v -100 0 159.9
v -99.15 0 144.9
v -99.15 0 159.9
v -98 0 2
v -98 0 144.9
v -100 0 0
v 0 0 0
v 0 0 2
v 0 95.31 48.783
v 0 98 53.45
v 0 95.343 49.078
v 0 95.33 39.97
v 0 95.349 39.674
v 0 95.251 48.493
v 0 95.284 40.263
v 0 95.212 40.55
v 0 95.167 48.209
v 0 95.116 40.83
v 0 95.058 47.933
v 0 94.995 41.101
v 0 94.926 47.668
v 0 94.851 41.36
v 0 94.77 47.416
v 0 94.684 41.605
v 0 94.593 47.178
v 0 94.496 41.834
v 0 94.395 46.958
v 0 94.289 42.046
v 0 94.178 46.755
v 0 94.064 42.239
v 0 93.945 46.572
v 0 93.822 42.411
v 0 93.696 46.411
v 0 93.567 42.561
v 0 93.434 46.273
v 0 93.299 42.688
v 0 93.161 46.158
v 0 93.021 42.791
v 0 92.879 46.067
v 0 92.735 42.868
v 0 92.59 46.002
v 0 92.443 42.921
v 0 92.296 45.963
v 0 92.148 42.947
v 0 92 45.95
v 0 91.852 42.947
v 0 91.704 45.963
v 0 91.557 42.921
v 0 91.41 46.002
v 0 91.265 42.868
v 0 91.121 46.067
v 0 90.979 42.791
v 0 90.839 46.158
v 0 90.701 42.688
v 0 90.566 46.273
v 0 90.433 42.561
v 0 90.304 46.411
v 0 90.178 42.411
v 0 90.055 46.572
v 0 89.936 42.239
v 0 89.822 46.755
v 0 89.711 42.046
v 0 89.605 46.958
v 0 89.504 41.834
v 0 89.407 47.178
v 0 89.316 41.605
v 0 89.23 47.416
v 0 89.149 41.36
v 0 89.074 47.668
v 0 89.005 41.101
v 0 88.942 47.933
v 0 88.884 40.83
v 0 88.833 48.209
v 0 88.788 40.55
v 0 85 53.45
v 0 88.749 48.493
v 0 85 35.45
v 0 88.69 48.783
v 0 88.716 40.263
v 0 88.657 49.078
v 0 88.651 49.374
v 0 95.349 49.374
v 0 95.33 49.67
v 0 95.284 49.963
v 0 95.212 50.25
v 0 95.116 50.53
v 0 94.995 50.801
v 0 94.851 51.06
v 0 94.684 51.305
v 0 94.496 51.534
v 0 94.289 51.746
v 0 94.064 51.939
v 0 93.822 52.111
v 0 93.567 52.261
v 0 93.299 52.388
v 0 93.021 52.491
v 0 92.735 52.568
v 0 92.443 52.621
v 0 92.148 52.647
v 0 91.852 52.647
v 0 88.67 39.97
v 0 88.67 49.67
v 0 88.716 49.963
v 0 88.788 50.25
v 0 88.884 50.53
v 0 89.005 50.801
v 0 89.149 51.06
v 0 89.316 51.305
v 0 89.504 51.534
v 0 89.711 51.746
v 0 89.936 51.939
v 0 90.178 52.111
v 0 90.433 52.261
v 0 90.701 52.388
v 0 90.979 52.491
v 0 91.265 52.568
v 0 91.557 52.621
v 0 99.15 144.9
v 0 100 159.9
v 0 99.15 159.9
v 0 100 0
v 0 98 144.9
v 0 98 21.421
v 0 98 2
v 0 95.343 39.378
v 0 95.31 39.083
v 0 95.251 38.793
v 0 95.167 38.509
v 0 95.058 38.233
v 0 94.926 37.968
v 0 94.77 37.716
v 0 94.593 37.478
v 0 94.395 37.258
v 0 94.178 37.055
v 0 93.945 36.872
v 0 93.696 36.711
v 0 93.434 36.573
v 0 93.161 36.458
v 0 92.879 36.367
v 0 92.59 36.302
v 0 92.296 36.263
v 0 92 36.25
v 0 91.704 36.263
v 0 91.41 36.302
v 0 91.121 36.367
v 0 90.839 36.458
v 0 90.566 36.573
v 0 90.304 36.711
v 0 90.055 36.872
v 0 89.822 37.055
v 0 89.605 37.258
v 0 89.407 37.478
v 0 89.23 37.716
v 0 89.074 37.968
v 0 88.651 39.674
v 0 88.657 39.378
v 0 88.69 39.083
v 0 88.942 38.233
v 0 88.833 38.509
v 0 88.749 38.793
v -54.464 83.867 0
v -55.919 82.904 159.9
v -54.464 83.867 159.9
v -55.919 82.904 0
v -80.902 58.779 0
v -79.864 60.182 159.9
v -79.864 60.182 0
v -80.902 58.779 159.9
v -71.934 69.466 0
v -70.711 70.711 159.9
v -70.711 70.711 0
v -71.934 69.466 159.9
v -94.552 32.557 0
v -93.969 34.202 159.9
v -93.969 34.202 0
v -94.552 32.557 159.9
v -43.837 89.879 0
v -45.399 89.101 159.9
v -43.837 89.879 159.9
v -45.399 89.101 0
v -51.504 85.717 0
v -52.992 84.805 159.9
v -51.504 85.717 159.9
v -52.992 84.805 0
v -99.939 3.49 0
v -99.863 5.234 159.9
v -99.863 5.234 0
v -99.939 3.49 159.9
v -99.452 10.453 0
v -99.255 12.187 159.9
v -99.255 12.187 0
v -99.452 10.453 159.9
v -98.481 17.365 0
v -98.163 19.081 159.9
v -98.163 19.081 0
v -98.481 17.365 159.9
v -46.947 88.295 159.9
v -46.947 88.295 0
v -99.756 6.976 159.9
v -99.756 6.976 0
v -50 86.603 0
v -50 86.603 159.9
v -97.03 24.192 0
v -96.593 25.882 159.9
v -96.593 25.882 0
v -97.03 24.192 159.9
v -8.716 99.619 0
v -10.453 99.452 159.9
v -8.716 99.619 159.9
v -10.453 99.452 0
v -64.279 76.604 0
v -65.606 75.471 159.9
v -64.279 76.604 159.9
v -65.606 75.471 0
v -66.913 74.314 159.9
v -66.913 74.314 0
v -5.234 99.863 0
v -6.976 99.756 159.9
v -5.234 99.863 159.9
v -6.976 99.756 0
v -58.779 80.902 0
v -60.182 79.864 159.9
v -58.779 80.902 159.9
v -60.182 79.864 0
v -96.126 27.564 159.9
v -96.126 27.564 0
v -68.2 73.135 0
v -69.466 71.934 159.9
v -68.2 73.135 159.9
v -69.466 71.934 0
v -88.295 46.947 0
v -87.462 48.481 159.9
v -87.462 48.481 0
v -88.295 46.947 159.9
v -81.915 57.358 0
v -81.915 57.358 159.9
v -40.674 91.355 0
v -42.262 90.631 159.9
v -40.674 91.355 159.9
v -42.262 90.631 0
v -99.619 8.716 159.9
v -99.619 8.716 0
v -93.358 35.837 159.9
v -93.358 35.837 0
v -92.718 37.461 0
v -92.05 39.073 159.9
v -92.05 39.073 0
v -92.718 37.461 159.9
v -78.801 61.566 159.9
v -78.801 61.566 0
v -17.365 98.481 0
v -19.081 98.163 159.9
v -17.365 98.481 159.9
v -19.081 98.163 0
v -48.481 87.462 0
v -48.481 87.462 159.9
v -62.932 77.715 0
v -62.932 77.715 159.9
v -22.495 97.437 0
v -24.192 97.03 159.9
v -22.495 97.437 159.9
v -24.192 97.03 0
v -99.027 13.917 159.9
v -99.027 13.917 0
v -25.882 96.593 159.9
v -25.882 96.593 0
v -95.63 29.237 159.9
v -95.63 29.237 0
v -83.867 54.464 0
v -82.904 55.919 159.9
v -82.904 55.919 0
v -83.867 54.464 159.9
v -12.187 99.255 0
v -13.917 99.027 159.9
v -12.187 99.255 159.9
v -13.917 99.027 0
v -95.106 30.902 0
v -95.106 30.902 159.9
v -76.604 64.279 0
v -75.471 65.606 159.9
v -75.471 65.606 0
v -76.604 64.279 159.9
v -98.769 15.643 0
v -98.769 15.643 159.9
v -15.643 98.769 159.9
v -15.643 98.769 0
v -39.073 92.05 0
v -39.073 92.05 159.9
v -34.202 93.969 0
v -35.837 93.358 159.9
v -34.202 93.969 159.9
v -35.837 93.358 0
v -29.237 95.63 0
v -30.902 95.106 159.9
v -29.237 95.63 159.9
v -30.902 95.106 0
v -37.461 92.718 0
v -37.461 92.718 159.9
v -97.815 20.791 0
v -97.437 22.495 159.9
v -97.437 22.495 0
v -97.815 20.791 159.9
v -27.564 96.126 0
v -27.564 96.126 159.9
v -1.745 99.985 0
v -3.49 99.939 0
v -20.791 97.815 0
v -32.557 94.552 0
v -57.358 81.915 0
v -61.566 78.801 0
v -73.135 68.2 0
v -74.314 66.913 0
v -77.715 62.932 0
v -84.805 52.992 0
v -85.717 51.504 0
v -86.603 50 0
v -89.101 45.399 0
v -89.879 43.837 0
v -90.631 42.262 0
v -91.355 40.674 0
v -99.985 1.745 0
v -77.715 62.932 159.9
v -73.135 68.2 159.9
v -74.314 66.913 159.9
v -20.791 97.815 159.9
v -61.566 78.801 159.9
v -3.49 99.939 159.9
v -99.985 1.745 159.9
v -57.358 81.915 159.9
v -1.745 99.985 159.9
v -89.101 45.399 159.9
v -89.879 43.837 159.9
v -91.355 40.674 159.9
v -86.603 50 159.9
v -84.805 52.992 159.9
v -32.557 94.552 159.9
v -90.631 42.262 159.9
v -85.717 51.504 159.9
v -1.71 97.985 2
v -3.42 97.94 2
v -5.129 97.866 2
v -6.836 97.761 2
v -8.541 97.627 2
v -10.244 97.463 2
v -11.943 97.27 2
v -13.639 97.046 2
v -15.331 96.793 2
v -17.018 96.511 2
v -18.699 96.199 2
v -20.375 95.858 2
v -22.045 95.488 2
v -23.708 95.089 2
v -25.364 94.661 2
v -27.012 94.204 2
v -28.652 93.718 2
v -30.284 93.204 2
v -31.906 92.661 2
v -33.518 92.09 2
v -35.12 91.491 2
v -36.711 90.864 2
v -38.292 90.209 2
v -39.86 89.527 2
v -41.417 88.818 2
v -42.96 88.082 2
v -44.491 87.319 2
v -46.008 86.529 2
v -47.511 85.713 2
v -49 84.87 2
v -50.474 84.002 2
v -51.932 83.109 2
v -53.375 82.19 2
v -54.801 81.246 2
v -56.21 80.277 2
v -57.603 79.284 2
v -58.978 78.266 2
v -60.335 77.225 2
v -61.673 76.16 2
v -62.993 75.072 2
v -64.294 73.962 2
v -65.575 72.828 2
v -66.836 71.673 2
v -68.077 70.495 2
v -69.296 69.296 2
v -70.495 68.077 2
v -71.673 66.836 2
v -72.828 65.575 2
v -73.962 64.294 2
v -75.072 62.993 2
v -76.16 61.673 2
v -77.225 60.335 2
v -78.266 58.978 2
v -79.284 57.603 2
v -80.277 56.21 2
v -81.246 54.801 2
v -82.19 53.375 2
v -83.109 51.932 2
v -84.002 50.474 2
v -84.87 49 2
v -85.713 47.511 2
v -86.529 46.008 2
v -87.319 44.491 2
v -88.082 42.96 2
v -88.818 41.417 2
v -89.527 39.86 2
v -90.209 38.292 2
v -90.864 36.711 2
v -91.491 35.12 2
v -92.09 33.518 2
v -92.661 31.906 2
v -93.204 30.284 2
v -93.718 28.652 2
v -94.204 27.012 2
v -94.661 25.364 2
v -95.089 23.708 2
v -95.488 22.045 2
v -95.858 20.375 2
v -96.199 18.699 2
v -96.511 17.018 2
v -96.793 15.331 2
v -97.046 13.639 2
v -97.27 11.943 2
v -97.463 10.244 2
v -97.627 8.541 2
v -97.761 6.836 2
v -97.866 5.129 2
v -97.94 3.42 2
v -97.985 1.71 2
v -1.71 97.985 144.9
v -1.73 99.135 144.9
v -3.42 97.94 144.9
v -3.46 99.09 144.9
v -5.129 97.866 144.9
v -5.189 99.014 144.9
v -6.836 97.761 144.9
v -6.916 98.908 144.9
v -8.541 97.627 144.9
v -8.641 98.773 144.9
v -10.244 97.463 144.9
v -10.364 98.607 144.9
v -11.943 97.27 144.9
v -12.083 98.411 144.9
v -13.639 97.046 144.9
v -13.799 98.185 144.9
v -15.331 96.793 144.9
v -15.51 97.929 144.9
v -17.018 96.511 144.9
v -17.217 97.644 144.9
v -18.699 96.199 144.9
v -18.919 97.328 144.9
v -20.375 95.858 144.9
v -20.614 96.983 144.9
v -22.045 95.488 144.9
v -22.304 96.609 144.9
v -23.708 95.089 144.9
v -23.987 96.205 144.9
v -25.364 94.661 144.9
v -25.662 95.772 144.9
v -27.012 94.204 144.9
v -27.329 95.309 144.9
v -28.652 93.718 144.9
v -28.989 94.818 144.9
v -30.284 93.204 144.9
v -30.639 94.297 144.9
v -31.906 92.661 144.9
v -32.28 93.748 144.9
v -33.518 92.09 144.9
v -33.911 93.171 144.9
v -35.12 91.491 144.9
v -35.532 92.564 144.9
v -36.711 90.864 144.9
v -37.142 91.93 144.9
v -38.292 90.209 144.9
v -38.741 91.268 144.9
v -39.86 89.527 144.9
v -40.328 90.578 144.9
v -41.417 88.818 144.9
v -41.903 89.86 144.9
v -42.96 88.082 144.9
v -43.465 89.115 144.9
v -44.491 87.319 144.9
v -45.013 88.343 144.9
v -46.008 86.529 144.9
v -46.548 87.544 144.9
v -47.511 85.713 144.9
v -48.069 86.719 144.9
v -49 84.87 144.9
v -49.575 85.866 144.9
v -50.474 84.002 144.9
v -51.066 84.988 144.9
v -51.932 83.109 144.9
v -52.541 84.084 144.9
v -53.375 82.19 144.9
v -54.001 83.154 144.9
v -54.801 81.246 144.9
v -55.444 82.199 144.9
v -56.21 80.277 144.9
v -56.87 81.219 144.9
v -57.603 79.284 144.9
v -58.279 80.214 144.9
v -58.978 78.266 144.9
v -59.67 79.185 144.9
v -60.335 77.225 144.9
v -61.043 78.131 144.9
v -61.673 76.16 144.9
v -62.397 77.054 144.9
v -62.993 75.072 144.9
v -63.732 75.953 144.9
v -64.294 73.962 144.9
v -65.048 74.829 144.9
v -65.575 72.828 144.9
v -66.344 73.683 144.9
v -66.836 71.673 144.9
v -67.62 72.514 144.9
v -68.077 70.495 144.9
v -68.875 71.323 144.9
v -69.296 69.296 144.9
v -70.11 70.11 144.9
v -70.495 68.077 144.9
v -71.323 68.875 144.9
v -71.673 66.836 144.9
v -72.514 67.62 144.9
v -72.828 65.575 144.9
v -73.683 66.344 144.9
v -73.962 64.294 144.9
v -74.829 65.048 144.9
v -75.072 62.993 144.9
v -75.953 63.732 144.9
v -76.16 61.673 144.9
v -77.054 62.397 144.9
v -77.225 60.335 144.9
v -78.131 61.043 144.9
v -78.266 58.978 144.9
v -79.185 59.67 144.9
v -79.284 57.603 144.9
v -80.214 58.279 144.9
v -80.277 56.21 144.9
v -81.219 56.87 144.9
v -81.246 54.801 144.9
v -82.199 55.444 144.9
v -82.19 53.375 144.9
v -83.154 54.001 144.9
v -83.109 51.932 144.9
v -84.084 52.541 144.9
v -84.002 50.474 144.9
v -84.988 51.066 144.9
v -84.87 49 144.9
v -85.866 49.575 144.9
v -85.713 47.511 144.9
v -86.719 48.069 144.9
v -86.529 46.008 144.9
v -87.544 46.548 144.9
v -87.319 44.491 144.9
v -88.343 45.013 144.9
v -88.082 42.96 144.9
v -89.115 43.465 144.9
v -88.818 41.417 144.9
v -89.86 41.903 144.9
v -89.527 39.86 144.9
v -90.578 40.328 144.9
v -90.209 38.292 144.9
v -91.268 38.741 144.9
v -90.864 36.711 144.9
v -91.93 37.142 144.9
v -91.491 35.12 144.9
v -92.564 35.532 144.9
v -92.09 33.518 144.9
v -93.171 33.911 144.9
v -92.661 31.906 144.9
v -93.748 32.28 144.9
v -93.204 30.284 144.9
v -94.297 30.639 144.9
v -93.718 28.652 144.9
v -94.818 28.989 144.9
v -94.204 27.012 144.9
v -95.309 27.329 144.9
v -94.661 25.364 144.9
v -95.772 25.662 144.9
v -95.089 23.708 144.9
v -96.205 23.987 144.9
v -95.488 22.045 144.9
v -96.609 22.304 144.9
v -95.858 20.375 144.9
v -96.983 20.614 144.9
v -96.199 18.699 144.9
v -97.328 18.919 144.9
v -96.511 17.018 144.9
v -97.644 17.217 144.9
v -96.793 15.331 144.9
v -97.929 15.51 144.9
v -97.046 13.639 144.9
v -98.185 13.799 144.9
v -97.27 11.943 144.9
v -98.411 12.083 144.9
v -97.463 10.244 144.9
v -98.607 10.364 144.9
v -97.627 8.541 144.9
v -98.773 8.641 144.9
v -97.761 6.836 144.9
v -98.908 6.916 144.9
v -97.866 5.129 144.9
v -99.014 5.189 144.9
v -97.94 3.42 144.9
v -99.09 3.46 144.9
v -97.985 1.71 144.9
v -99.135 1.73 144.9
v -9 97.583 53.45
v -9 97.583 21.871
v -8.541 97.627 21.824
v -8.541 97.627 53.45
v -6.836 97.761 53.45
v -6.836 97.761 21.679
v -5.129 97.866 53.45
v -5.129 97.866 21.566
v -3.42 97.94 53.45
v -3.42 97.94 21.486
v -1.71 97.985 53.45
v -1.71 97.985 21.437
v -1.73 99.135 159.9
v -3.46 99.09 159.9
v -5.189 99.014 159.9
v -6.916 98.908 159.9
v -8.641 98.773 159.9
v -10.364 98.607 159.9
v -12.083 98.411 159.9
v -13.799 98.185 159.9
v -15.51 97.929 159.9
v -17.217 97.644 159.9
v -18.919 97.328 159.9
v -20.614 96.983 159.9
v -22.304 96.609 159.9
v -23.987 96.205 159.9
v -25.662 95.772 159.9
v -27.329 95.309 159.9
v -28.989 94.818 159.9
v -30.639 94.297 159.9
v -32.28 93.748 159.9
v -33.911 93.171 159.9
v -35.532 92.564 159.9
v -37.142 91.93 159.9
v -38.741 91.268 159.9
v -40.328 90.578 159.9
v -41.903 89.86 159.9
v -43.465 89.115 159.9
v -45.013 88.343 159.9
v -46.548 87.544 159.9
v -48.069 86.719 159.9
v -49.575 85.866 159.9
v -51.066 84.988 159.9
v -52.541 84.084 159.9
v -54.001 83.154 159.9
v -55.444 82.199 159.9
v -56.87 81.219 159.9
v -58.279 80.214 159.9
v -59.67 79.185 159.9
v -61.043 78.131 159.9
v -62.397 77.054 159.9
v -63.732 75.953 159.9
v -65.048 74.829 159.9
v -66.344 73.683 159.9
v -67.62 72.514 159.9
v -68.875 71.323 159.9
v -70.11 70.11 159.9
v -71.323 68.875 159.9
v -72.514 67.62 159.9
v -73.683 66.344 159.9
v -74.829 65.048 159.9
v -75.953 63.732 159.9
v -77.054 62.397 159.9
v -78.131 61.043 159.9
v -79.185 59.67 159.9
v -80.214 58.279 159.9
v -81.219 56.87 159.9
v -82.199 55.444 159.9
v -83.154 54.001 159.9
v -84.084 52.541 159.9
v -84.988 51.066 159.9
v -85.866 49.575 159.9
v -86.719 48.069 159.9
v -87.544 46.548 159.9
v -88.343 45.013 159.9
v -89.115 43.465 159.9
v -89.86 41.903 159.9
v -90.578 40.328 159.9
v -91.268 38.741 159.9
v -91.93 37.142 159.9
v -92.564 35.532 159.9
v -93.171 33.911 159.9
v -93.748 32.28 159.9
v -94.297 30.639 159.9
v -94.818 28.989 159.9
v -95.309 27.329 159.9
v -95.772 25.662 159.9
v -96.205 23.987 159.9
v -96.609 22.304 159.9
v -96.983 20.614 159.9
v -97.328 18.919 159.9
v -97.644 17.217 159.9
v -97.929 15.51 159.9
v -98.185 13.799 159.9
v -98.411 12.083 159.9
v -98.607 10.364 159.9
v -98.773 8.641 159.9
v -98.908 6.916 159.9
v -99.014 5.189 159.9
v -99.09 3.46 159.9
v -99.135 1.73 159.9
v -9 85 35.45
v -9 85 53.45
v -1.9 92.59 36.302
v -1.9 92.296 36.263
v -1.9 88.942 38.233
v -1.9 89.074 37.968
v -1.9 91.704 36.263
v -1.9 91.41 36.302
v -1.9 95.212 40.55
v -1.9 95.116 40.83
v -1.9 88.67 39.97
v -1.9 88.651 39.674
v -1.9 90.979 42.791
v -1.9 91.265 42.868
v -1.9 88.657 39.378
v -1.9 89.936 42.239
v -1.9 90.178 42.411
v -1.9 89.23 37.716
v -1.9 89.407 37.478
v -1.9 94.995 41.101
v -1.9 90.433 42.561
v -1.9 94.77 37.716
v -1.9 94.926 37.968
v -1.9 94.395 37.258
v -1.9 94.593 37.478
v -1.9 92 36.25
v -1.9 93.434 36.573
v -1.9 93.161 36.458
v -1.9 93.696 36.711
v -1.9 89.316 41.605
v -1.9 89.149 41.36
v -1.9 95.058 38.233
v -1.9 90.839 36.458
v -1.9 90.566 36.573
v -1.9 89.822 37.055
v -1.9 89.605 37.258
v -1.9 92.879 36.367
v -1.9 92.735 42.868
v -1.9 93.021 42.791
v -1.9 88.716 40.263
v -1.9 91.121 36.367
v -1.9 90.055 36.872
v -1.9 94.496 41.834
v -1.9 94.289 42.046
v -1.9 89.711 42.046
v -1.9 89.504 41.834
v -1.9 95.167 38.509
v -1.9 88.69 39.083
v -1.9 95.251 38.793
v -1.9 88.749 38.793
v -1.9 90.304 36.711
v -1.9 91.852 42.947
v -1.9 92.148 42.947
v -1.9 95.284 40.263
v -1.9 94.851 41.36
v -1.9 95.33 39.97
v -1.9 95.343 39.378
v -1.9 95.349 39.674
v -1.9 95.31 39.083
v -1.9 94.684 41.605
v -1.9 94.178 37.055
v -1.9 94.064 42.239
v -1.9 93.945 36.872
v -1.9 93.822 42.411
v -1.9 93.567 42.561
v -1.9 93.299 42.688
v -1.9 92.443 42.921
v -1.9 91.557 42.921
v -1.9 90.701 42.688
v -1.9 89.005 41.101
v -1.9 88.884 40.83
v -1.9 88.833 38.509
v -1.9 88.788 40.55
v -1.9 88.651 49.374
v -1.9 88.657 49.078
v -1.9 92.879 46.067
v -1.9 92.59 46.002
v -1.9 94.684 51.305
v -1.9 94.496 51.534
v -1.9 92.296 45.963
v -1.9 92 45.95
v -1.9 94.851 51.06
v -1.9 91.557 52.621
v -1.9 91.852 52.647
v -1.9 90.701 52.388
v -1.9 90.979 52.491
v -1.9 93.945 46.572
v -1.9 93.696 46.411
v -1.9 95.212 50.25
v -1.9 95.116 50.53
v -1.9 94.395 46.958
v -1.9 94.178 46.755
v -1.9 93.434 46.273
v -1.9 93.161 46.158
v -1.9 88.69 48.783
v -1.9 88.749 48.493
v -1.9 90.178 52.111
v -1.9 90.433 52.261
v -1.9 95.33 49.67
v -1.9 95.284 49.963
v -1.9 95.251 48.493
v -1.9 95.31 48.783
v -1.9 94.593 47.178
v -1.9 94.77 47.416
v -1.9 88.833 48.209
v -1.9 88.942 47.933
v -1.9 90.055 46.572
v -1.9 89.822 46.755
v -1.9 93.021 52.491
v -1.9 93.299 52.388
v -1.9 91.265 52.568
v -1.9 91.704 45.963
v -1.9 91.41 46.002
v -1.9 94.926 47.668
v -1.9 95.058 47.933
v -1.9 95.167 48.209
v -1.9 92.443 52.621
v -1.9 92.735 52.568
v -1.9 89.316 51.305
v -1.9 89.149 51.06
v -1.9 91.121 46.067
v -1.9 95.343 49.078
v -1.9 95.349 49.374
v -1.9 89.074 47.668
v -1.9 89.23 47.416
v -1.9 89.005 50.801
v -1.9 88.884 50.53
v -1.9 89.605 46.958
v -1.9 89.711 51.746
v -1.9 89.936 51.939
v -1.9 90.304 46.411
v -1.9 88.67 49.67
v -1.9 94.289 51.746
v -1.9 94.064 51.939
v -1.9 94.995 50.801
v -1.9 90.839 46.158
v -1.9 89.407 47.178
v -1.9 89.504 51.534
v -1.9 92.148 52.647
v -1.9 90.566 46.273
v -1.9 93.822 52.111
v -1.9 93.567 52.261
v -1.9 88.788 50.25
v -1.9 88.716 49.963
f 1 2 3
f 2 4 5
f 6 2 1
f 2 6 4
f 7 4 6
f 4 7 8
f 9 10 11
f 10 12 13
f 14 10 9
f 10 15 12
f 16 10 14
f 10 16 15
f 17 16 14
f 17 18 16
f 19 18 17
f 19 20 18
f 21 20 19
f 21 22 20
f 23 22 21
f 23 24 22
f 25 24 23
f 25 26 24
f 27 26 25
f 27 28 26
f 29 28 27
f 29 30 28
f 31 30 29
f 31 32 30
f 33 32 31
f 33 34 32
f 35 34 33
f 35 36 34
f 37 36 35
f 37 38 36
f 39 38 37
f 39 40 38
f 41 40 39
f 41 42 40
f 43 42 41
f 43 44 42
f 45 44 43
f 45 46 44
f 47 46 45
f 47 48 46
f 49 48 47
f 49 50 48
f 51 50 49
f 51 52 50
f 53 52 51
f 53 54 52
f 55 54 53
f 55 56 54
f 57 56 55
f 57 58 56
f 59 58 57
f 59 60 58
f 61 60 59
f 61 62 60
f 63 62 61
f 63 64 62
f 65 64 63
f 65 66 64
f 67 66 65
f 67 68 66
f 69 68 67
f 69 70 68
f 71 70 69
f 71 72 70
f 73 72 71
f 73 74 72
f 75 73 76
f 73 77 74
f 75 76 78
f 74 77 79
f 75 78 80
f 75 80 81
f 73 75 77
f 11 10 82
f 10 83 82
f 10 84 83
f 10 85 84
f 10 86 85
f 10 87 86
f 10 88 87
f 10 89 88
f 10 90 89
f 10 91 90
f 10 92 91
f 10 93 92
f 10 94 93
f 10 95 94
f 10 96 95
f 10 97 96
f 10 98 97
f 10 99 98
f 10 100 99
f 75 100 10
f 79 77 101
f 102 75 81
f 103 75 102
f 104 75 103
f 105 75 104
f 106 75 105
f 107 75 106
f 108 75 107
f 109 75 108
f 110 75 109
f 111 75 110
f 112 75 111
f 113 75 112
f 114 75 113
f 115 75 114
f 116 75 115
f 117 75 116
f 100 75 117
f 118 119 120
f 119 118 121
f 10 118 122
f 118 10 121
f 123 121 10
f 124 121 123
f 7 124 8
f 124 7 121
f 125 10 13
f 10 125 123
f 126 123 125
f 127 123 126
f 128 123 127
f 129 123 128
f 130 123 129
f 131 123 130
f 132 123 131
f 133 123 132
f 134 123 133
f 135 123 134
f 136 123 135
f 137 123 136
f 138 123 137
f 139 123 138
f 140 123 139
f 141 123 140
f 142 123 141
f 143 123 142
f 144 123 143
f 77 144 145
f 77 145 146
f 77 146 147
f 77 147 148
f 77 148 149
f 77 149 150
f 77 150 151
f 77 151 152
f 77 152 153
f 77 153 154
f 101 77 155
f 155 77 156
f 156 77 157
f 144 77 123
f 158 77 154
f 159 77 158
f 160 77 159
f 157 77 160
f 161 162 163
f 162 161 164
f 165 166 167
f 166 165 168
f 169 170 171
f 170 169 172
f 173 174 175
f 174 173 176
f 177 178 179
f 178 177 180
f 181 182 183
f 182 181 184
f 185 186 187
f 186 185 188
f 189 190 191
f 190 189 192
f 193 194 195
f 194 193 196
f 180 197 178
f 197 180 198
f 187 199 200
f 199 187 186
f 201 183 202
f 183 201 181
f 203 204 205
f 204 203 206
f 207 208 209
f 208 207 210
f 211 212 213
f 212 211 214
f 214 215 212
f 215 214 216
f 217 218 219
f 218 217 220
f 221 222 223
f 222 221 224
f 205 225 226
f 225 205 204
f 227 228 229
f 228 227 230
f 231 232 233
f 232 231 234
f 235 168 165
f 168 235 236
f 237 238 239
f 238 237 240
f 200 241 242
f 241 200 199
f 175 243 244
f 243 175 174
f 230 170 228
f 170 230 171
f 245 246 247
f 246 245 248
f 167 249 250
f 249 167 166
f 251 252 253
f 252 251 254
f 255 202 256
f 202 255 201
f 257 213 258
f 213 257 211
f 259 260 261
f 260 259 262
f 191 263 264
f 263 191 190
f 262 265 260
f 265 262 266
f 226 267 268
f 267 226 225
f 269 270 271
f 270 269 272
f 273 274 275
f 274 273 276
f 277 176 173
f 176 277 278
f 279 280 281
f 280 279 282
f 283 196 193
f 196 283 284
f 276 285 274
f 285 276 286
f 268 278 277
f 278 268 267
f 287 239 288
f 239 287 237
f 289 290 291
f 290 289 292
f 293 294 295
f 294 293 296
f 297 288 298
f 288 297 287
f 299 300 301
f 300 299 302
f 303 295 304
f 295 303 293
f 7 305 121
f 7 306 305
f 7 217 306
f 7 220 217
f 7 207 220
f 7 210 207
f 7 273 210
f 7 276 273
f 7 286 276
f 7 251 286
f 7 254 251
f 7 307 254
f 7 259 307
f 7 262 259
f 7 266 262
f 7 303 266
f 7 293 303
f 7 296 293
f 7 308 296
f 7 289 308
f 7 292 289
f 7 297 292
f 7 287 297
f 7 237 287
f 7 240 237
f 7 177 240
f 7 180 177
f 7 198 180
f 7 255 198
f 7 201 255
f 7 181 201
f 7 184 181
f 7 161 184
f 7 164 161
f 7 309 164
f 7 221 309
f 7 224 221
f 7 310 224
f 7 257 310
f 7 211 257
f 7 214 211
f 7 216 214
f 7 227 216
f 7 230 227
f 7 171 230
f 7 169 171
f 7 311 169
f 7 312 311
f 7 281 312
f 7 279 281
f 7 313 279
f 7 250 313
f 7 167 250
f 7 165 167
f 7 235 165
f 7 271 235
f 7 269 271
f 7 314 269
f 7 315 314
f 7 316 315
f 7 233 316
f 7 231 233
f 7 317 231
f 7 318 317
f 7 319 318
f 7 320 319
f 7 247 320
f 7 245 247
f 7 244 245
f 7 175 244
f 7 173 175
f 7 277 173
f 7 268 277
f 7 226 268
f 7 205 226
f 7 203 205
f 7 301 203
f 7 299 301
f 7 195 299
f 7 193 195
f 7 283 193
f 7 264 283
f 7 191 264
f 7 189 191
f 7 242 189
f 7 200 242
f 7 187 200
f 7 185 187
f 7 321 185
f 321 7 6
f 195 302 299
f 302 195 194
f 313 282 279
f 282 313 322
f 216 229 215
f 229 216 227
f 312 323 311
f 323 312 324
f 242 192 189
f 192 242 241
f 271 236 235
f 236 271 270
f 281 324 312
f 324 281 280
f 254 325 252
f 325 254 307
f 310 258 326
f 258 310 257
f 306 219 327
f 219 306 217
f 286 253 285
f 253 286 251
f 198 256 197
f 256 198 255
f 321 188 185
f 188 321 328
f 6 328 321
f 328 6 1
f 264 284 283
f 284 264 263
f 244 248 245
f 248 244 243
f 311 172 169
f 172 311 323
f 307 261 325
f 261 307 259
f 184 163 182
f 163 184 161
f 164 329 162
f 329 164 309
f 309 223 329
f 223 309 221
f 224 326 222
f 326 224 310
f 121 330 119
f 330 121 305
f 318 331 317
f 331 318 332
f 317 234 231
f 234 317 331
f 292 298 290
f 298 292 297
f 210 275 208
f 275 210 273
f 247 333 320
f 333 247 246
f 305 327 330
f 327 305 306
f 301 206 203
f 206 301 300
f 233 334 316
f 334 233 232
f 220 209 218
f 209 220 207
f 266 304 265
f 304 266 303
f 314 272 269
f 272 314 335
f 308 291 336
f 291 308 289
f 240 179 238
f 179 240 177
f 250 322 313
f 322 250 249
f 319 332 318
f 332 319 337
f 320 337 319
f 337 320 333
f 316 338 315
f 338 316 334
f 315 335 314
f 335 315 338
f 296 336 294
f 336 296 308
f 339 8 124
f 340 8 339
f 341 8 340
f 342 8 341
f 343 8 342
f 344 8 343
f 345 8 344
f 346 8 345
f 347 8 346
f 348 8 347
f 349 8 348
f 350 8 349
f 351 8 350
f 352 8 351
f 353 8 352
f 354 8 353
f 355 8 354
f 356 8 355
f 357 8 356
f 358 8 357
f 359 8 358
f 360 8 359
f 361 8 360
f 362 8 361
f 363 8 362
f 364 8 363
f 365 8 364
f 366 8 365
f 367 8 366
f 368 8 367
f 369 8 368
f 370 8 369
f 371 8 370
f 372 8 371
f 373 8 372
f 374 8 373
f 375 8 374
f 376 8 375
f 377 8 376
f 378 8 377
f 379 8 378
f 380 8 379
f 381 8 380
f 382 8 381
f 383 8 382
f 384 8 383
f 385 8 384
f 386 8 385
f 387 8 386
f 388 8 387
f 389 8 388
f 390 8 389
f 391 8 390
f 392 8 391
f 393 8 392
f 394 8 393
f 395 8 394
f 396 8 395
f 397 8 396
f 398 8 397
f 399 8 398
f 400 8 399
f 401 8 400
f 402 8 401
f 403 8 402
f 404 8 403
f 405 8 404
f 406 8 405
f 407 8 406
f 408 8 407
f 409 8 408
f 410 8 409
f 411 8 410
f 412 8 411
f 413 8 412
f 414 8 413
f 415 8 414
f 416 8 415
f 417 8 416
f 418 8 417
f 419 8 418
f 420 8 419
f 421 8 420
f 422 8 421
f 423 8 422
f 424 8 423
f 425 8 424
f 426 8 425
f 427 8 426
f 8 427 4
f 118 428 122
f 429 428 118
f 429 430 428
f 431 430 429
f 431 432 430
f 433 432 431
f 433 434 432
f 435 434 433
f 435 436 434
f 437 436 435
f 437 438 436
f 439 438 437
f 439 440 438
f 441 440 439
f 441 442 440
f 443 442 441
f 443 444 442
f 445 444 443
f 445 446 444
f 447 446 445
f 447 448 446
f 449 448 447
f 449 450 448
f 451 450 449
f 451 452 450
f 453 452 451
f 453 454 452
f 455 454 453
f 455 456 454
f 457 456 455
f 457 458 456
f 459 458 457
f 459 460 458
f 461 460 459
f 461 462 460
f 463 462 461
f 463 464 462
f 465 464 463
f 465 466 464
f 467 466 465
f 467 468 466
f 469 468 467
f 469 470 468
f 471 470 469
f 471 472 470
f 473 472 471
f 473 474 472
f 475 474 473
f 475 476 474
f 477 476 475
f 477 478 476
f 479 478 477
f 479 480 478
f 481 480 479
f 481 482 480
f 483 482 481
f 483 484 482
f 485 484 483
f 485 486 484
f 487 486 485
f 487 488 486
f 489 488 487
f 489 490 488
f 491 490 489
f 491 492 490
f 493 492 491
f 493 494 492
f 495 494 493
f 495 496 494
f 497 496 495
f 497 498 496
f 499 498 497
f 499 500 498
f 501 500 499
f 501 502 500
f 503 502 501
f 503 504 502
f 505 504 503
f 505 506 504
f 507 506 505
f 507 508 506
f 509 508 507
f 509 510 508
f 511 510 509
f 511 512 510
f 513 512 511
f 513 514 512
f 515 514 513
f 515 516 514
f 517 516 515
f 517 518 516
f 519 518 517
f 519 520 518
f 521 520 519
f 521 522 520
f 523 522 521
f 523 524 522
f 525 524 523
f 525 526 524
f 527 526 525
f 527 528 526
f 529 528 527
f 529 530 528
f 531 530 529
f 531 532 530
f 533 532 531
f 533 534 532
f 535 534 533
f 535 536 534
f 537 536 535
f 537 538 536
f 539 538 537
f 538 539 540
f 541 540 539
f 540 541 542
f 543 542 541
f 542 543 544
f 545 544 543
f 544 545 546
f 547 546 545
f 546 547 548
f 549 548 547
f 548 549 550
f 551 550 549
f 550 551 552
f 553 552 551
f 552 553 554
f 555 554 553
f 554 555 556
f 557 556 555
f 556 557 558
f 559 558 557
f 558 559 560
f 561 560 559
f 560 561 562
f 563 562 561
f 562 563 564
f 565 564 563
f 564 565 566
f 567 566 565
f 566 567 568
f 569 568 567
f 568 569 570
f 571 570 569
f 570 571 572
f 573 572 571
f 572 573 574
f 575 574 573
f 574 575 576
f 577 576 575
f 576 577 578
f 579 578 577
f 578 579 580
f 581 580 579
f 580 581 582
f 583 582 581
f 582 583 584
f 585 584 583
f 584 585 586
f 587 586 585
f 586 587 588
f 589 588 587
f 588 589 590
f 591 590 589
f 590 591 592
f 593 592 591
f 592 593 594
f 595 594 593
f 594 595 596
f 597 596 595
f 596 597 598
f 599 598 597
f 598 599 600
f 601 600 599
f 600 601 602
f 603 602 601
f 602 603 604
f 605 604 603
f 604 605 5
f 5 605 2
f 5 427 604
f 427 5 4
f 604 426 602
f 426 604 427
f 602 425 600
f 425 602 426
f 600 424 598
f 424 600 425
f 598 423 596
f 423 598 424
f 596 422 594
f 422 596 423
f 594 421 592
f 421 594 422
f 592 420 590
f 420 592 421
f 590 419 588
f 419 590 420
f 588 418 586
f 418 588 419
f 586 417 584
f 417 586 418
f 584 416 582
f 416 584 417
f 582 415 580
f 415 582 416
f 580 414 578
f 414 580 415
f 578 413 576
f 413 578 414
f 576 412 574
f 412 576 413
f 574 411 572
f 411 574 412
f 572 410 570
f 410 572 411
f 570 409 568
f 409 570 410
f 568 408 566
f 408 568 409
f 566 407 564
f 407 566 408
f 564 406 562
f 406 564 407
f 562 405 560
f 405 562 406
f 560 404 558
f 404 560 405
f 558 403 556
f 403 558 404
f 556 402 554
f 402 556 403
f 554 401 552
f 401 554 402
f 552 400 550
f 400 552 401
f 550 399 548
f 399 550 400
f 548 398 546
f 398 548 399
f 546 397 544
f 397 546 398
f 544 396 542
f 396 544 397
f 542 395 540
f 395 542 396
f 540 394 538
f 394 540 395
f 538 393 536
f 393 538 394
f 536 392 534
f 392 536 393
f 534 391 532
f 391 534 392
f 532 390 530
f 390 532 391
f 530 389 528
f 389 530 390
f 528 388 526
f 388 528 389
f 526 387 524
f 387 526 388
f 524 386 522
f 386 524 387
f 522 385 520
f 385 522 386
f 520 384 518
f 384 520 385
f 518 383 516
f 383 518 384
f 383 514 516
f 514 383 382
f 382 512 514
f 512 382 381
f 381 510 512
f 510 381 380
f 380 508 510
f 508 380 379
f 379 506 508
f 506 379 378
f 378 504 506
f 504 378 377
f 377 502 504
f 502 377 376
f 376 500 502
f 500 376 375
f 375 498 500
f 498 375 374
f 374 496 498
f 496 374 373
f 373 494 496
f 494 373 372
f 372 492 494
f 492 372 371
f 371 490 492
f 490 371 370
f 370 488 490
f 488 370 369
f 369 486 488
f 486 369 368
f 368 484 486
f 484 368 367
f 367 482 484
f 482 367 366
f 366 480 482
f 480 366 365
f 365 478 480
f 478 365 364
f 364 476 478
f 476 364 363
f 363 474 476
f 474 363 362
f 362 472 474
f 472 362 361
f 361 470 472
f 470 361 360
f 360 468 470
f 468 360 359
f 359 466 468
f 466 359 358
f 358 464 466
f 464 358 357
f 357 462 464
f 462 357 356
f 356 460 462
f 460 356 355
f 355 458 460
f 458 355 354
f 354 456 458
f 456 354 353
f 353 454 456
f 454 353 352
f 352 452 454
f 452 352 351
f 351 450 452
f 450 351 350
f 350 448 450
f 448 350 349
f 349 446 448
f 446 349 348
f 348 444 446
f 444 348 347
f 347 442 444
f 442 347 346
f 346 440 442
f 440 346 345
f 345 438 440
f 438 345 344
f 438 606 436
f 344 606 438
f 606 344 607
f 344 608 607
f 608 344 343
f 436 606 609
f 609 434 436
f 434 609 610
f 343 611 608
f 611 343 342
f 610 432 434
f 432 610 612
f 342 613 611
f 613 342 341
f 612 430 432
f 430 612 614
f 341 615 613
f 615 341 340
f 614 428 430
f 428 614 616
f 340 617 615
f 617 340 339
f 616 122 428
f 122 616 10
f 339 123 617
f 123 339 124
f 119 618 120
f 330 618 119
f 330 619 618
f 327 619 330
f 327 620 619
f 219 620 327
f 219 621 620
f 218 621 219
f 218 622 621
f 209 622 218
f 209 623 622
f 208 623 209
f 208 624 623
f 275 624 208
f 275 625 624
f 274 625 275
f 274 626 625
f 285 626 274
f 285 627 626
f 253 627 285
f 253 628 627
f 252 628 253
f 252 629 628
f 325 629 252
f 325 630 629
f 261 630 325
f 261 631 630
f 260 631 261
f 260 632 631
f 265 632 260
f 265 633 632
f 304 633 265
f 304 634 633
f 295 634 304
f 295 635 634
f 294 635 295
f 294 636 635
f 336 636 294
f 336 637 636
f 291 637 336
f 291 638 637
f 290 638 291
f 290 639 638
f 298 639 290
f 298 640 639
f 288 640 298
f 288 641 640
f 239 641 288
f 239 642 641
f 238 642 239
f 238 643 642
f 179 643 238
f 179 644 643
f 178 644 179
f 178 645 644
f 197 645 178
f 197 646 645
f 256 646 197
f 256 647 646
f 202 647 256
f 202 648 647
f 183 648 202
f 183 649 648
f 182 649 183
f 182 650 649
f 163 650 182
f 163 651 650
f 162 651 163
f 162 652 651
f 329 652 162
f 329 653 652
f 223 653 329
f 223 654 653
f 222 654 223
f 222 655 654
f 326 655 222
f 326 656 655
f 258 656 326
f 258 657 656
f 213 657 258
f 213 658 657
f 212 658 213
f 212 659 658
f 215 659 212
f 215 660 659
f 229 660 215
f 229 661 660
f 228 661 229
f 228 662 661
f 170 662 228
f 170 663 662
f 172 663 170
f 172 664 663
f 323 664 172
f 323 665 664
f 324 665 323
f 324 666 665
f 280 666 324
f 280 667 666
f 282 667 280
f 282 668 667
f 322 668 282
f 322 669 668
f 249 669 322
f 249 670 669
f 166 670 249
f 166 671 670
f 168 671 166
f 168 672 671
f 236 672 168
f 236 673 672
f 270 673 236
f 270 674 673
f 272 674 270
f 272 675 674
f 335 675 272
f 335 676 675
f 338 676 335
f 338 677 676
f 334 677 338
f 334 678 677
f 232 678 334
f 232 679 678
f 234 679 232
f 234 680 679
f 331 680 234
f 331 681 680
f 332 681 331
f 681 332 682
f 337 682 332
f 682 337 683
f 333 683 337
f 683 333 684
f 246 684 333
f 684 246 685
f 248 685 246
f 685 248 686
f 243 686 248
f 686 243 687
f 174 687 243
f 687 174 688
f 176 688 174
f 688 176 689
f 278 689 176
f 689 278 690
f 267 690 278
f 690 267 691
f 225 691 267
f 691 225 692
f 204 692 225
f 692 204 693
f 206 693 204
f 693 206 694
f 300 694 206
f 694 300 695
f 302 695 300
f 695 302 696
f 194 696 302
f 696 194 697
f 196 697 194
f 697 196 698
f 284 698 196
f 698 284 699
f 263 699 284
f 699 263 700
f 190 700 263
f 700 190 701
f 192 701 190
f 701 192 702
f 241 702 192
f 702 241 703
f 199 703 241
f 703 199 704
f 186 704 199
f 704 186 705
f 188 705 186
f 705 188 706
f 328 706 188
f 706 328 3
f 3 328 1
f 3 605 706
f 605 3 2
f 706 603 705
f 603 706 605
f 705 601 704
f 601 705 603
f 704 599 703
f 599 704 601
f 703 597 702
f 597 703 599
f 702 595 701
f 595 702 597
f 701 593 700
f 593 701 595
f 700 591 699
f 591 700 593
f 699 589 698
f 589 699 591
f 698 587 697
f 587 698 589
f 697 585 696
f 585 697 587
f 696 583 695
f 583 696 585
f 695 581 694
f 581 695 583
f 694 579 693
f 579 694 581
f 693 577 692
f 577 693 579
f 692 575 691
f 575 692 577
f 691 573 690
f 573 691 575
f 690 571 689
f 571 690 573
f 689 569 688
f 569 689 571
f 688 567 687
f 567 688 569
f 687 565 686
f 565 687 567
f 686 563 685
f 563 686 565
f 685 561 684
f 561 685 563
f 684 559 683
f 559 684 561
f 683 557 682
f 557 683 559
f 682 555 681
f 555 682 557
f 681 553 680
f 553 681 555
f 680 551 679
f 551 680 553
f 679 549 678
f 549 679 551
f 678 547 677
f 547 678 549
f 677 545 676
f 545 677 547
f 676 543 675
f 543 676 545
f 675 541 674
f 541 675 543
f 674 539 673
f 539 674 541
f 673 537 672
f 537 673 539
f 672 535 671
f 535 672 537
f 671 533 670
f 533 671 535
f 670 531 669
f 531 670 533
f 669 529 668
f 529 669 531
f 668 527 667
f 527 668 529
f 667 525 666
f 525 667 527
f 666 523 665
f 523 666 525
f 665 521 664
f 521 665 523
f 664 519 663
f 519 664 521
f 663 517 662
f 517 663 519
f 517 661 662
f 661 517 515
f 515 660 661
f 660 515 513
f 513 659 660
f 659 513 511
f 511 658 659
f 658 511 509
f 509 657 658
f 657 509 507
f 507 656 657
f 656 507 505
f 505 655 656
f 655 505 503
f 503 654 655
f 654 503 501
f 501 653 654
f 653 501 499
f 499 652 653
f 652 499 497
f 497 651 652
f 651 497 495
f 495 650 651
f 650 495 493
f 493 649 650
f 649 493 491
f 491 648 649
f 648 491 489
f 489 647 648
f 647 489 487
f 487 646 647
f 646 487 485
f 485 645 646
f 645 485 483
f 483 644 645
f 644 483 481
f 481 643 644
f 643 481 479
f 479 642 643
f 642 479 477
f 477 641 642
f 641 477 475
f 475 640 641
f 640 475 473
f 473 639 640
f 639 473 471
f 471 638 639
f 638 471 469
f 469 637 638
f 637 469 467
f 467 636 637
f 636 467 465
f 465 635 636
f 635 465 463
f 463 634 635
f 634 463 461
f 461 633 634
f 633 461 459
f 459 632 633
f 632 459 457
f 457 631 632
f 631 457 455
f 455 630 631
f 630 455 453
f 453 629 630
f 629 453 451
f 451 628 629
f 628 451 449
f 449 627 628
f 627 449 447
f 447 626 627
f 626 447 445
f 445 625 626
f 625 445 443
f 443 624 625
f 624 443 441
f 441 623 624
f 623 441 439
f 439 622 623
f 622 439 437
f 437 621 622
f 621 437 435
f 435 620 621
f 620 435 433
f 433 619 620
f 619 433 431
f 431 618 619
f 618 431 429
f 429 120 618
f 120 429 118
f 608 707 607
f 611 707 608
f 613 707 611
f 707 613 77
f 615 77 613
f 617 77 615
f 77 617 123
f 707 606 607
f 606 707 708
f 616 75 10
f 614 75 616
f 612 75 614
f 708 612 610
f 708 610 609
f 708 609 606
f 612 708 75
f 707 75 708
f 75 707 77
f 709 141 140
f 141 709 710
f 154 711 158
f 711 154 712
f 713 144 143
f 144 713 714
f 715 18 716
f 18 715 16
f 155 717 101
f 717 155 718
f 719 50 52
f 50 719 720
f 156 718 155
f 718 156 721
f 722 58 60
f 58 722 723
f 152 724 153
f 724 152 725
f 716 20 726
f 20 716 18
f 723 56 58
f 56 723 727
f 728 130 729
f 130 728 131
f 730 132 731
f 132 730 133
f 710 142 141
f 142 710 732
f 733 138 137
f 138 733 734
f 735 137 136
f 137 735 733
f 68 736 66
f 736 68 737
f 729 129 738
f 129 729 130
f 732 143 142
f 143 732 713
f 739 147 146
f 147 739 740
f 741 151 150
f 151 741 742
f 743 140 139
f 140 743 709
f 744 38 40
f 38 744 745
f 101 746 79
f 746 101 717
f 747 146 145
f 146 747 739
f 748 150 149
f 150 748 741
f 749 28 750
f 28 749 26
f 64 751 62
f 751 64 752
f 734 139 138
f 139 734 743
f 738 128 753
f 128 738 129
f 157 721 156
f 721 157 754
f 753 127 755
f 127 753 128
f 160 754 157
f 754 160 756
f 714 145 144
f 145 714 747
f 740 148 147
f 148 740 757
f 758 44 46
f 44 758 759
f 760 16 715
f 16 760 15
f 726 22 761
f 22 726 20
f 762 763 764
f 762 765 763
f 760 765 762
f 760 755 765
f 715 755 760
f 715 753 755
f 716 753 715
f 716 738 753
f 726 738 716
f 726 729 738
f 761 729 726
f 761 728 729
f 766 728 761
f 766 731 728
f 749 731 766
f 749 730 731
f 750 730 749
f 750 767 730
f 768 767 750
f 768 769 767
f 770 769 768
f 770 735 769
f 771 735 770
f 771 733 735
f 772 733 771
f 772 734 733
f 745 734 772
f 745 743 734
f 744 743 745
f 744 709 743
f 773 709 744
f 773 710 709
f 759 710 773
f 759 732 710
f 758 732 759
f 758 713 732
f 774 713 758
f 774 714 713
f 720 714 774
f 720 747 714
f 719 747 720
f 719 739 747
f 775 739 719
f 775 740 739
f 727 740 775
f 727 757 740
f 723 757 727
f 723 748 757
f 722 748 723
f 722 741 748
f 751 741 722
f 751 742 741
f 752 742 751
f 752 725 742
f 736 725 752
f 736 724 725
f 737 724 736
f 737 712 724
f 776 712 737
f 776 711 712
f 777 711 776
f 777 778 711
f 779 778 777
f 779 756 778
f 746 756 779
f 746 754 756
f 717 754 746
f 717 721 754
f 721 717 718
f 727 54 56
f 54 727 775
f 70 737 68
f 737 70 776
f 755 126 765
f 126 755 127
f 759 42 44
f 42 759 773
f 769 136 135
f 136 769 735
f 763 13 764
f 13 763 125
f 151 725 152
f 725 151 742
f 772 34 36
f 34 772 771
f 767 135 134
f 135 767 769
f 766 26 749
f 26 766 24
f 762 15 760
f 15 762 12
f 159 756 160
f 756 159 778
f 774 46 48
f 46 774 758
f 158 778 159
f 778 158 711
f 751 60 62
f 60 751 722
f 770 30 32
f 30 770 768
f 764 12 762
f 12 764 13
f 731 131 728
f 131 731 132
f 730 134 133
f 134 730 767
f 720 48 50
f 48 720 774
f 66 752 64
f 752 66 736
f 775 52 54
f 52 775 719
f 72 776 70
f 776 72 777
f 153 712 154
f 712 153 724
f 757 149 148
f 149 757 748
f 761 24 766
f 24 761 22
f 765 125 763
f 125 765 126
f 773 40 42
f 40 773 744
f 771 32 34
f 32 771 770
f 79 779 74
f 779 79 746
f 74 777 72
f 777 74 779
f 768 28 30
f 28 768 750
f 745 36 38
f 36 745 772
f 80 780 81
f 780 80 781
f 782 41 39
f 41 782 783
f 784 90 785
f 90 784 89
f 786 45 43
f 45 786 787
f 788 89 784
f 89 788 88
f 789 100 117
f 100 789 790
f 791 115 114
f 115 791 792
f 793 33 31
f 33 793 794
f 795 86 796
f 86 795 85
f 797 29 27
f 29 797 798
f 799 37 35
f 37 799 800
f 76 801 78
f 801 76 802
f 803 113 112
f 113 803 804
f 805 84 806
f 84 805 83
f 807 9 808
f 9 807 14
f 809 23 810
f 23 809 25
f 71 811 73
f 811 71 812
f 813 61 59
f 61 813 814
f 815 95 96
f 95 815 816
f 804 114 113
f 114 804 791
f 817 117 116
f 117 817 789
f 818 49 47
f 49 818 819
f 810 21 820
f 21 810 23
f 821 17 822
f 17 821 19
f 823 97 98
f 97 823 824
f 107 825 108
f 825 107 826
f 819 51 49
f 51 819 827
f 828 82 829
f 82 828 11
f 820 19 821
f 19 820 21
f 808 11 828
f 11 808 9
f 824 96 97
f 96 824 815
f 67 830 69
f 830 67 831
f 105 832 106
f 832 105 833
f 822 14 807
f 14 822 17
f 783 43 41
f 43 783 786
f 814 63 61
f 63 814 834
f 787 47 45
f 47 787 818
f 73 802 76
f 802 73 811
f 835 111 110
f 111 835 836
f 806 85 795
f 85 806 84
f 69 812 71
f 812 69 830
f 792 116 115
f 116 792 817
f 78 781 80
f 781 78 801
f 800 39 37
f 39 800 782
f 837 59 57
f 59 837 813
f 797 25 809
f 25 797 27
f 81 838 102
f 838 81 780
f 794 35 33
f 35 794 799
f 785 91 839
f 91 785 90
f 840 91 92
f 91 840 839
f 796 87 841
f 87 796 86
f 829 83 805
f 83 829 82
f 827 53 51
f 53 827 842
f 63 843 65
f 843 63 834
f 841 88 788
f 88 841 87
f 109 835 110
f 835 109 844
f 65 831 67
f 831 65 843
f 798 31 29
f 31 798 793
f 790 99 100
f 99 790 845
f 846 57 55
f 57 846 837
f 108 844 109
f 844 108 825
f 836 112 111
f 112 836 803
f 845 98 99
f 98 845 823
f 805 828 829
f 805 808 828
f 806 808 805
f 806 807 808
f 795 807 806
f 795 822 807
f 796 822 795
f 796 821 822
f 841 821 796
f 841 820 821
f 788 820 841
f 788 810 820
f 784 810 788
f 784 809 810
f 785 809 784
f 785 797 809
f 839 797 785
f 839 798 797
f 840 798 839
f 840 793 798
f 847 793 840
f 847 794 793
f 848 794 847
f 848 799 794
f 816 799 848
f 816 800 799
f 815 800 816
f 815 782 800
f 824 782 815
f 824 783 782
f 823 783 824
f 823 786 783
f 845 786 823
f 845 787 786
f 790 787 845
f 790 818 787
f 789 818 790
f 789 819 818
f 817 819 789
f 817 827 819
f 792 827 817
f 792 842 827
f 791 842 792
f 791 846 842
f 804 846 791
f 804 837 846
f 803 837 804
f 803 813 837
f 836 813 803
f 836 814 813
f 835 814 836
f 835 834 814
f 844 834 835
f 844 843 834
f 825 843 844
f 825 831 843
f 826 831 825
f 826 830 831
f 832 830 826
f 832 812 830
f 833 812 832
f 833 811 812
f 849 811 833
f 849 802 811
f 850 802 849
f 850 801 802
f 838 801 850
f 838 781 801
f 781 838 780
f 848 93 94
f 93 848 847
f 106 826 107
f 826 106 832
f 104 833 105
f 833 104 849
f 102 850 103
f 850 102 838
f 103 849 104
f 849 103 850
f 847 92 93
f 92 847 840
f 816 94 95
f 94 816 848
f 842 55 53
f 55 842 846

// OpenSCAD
// vent_deflector.scad — 12" magnetic wall-vent deflector, magnets 8.5" apart.
//
// Remix of "6-20 Expandable Vent Cover / Vent Deflector" (MakerWorld 2722921,
// 6-12" profile). The original is two telescoping 6" halves; this version is
// two fixed-length halves joined with a half-lap at the middle so the scoop
// spans 12" while the magnets sit 8.5" apart (1.75" in from each end).
//
// Cross-section (both parts): quarter-cylinder scoop, outer R 100, wall 2 mm,
// arc centre at the origin. Wall-contact face is the plane x = 0 (part lies
// in x <= 0), the open air-exit face is y = 0, the "hood" (where the arc meets
// the wall at a right angle) is at y = 100. Each half prints standing on its
// end cap (cap on the bed, +z up), exactly like the original.
//
// Magnet pockets: two per boss, dia 6.7 x 1.9 deep, open toward the wall face,
// on 9.7 mm centres — copied from the original (fits 6 x 2 mm disc magnets,
// glue in). The bosses hang under the hood, the same location the original
// designer used for the inner half's magnets, so they print cap-down without
// support (45 deg chamfer on the underside).
//
// Parts:
//   part = "half_A"    cap end + outer lap  (prints cap-down)
//   part = "half_B"    cap end + inner lap  (prints cap-down)
//   part = "assembly"  both halves joined, for preview / measuring
//   part = "fit_check" intersection of the two halves — must render EMPTY

part = "half_A";

// ---- dimensions ----------------------------------------------------------
total_len      = 12 * 25.4;    // 304.8 — overall scoop length (2 halves joined)
magnet_spacing = 8.5 * 25.4;   // 215.9 — centre-to-centre between the two bosses
R      = 100;                  // outer radius = projection off the wall = height
wall   = 2;
cap_t  = 2;                    // end-cap thickness (original: 1-2 mm)

// half-lap joint at the middle
lap_len = 15;                  // overlap length
lap_clr = 0.15;                // radial clearance per side (0.30 total)

// hood magnet boss (block under the hood at the wall face)
boss_d       = 9;              // depth away from the wall face (x)
boss_w       = 14;             // height down from the hood (y)
boss_h       = 18;             // length along z
boss_chamfer = 15;             // 45 deg chamfer under the boss (print support)
pocket_d     = 6.7;            // magnet pocket dia (6 mm magnet + 0.35/side)
pocket_depth = 1.9;            // 2 mm magnet sits ~0.1 proud for good contact
pocket_pitch = 9.7;            // centre spacing of the two pockets in a boss

// optional extra magnets on the end caps, mid-face, like the original's cap
// bosses (also prints cap-down). Off by default: the user asked for 8.5" only.
cap_magnets = false;
cap_boss_d  = 4;               // pocket block depth (x) before the fillet
cap_boss_w  = 20;              // width along the face (y), centred
cap_boss_h  = 10.5;            // from the cap's outer face
cap_boss_fillet = 8.5;

// ---- derived --------------------------------------------------------------
half_len = (total_len + lap_len) / 2;         // each half incl. its lap zone
boss_z   = (total_len - magnet_spacing) / 2;  // boss centre, from the cap face
R_in     = R - wall;
R_mid    = R - wall / 2;
EPS      = 0.01;
$fa = 1; $fs = 0.3;

// ---- primitives -----------------------------------------------------------
// quarter ring (angle 0..90 in the x<=0, y>=0 quadrant) between radii, z0..z1
module qring(r_in, r_out, z0, z1) {
    mirror([1, 0, 0]) rotate_extrude(angle = 90)
        translate([r_in, z0]) square([r_out - r_in, z1 - z0]);
}
module qdisc(r, z0, z1) {
    mirror([1, 0, 0]) rotate_extrude(angle = 90)
        translate([0, z0]) square([r, z1 - z0]);
}

module hood_boss() {
    hull() {
        translate([-boss_d, R - 1 - boss_w, boss_z - boss_h / 2])
            cube([boss_d, boss_w, boss_h]);
        // sliver on the hood wall, below: gives the 45 deg underside chamfer
        translate([-boss_d, R - 1 - 0.1, boss_z - boss_h / 2 - boss_chamfer])
            cube([boss_d, 0.1, 0.1]);
    }
}
module hood_pockets() {
    for (s = [-1, 1])
        translate([-pocket_depth, R - 1 - boss_w / 2, boss_z + s * pocket_pitch / 2])
            rotate([0, 90, 0]) cylinder(d = pocket_d, h = pocket_depth + EPS);
}

// cap boss: block on the cap at mid-face with a quarter-round fillet toward
// the inside, profile in the x-z plane extruded along y
module cap_boss() {
    translate([0, R / 2 - cap_boss_w / 2, 0]) rotate([90, 0, 0]) mirror([0, 0, 1])
        linear_extrude(cap_boss_w) polygon(concat(
            [[0, 0], [0, cap_boss_h], [-cap_boss_d, cap_boss_h]],
            [for (a = [0 : 5 : 90])
                [-cap_boss_d - cap_boss_fillet + cap_boss_fillet * cos(a),
                 cap_t + cap_boss_fillet - cap_boss_fillet * sin(a)]],
            [[-cap_boss_d - cap_boss_fillet, 0]]));
}
module cap_pockets() {
    for (s = [-1, 1])
        translate([-pocket_depth, R / 2 + s * pocket_pitch / 2, cap_boss_h - 5])
            rotate([0, 90, 0]) cylinder(d = pocket_d, h = pocket_depth + EPS);
}

// ---- halves ---------------------------------------------------------------
module half(kind) {
    difference() {
        union() {
            qdisc(R, 0, cap_t);                              // end cap
            qring(R_in, R, cap_t - EPS, half_len - lap_len); // full wall
            if (kind == "A")                                 // outer lap
                qring(R_mid + lap_clr, R, half_len - lap_len - EPS, half_len);
            else                                             // inner lap
                qring(R_in, R_mid - lap_clr, half_len - lap_len - EPS, half_len);
            hood_boss();
            if (cap_magnets) cap_boss();
        }
        hood_pockets();
        if (cap_magnets) cap_pockets();
    }
}

module assembly() {
    half("A");
    translate([0, 0, total_len]) mirror([0, 0, 1]) half("B");
}

if (part == "half_A") half("A");
else if (part == "half_B") half("B");
else if (part == "assembly") assembly();
else if (part == "fit_check")
    intersection() {
        half("A");
        translate([0, 0, total_len]) mirror([0, 0, 1]) half("B");
    }
